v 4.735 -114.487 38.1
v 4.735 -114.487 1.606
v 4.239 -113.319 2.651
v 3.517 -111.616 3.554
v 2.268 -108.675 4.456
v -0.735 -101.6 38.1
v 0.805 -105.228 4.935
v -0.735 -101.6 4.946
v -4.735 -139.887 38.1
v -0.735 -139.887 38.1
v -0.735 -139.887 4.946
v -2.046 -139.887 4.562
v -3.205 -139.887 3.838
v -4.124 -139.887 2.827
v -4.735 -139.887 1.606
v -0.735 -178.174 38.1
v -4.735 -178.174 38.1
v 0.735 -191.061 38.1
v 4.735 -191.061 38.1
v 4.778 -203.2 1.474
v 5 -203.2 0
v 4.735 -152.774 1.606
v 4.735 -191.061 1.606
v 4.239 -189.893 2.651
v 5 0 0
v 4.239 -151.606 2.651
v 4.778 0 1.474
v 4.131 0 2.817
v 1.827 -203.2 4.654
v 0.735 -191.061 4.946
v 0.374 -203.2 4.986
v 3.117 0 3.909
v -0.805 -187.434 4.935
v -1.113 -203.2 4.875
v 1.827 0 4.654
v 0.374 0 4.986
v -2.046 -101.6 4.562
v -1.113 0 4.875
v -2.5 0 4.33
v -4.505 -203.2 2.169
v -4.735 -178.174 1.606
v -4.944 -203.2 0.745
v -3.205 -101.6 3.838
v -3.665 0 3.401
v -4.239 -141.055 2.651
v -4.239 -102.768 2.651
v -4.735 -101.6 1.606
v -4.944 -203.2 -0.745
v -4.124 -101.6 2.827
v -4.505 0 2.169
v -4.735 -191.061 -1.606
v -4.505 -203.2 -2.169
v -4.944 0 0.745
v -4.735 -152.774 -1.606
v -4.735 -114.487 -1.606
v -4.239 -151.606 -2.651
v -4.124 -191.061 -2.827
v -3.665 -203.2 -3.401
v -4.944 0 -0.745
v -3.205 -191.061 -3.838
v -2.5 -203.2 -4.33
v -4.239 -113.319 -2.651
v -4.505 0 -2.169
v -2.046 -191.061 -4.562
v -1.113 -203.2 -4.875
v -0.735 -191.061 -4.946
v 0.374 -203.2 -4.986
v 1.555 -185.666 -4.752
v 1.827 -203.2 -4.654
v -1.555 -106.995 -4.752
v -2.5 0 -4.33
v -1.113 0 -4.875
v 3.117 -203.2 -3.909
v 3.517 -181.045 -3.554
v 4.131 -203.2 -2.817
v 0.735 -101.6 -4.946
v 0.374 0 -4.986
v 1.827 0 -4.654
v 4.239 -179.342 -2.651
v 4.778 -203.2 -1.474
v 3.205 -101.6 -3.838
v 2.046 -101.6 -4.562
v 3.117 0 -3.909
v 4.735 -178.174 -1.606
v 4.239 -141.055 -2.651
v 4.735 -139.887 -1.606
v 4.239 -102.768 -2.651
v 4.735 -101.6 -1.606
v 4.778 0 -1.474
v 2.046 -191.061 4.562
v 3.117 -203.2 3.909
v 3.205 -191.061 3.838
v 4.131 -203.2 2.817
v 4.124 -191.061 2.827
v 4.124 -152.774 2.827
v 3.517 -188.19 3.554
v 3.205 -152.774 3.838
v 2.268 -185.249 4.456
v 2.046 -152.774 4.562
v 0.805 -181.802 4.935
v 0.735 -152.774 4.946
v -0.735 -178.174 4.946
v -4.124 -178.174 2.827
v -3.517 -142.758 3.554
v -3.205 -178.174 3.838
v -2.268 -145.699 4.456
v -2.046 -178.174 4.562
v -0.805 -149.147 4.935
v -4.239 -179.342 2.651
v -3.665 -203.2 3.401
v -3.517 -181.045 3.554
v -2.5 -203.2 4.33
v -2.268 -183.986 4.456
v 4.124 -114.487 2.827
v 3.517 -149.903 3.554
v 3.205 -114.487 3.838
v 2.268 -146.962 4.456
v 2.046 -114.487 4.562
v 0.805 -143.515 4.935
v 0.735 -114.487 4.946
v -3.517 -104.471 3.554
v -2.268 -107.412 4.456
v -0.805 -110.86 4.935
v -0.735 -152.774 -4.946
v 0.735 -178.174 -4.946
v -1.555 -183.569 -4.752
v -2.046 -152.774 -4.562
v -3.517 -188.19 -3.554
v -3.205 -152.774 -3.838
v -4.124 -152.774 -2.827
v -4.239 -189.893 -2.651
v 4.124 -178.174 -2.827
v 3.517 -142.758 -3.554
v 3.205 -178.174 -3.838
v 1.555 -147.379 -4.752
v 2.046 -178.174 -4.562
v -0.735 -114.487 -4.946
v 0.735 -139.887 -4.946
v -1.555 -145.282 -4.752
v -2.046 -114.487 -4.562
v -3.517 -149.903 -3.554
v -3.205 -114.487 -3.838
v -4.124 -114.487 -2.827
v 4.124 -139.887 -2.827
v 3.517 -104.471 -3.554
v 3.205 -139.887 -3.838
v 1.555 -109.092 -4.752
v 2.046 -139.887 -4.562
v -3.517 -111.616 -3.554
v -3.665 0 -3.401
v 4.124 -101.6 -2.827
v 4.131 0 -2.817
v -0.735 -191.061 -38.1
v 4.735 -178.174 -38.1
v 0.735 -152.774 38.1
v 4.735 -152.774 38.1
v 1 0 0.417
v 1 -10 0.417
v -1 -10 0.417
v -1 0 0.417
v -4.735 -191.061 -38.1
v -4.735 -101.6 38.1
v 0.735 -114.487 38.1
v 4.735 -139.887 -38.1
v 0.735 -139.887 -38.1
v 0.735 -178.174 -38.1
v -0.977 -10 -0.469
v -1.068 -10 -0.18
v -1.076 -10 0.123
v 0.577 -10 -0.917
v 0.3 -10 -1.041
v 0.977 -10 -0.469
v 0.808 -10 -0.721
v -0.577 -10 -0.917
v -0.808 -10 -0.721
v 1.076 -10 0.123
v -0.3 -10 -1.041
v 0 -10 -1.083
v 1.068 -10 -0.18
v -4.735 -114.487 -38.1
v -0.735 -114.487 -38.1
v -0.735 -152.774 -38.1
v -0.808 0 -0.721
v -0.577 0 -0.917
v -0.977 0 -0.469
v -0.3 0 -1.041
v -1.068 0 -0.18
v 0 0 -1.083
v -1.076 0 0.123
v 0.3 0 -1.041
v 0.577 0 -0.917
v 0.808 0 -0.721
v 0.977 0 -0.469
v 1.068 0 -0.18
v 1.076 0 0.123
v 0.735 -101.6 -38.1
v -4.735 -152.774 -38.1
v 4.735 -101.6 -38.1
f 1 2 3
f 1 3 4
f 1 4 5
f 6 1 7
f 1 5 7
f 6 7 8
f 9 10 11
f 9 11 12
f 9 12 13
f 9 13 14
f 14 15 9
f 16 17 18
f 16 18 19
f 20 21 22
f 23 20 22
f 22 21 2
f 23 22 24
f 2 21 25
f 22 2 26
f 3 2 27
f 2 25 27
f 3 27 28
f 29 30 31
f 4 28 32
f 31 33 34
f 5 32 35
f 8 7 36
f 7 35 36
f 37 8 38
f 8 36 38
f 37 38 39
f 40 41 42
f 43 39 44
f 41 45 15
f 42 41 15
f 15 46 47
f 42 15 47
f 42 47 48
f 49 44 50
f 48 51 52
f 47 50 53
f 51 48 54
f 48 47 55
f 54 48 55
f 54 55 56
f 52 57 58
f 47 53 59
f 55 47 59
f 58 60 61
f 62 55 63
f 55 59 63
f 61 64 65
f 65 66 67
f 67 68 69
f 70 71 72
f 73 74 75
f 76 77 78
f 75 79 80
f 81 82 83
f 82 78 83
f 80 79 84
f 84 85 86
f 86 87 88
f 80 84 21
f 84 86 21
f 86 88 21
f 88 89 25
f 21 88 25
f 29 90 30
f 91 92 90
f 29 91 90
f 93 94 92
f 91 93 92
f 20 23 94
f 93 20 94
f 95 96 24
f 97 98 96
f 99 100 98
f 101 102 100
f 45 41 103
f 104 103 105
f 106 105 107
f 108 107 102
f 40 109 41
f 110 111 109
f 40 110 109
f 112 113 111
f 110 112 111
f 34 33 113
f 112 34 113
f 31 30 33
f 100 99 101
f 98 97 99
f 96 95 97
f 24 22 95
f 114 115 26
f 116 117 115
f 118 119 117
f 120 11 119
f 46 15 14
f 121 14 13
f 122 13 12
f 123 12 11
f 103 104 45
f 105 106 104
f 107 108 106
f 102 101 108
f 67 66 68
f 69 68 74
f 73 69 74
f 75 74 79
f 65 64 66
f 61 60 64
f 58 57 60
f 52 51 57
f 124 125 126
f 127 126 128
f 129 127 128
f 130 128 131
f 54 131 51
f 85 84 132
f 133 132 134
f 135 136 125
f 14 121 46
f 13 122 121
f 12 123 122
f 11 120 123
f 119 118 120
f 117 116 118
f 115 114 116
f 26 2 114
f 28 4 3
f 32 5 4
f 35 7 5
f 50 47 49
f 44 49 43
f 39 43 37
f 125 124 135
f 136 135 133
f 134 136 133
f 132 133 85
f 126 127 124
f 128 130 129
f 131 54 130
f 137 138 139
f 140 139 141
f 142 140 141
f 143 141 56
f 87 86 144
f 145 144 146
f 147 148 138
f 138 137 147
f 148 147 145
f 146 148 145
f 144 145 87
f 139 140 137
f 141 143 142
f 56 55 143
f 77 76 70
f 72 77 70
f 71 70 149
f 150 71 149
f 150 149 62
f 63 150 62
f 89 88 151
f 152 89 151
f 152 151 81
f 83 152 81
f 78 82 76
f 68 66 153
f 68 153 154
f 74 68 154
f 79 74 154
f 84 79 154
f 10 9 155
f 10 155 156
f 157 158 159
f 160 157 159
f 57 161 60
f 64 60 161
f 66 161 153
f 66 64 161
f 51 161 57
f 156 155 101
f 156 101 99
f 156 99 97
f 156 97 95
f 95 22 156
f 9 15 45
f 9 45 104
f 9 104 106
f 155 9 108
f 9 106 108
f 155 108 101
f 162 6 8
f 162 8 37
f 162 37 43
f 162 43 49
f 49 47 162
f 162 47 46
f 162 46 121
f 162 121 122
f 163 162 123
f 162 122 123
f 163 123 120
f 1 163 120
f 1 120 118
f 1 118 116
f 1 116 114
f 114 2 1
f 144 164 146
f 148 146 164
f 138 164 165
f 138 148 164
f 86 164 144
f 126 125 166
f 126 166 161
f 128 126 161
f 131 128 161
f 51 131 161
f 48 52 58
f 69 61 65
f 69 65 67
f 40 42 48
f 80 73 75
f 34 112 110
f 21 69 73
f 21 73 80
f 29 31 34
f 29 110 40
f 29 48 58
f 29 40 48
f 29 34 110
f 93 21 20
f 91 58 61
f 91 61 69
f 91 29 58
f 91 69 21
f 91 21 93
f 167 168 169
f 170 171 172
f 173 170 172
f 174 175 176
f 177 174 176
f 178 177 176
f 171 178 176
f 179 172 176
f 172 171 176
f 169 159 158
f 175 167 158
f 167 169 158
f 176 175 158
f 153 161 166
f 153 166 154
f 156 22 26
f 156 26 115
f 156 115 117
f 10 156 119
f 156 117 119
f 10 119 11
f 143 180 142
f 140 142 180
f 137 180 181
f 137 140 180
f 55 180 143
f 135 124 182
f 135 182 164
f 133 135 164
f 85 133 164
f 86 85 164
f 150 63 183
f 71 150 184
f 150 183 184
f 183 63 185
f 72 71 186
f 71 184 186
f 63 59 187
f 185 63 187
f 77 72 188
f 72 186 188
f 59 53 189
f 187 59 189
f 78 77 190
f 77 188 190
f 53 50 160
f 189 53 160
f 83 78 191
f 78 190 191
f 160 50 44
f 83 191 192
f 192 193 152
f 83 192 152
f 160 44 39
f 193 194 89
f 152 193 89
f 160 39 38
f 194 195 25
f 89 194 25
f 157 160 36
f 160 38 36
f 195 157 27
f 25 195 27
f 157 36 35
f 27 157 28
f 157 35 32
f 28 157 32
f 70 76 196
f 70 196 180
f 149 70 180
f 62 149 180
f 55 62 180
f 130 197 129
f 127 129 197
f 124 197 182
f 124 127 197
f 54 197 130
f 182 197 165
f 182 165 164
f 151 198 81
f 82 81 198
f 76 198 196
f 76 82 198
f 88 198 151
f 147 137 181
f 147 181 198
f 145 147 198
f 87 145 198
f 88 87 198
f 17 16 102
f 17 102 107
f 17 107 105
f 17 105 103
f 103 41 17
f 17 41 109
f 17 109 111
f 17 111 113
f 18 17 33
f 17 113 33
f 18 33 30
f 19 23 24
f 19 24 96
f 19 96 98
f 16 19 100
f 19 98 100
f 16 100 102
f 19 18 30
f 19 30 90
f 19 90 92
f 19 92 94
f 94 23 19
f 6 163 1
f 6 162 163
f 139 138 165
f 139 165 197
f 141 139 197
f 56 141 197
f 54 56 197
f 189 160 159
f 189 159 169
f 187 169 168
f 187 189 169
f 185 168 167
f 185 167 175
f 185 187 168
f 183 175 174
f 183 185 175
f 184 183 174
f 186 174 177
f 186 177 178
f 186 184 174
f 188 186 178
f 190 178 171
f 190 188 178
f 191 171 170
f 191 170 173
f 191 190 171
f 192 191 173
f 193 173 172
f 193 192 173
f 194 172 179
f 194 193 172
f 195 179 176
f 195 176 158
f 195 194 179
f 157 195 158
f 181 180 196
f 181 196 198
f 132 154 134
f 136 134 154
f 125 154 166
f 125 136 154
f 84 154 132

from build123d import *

# Parameters (mm, degrees)
F0_R     = 5
F1_DEPTH = 203.2
F3_DEPTH = 38.1
F5_DEPTH = 38.1
F7_DEPTH = 10


with BuildPart() as f1:
    # F0 (on Front) → F1 (new body)
    with BuildSketch(Plane.XZ):
        Circle(F0_R)
    extrude(amount=F1_DEPTH)

    # F2 (on Top) → F3 (join)
    with BuildSketch(Plane.XY):
        Polygon((0.735118, -114.487068), (4.735118, -114.487068), (-0.735118, -101.6), (-4.735118, -101.6), align=None)
        Polygon((4.735118, -152.774136), (-0.735118, -139.887068), (-4.735118, -139.887068), (0.735118, -152.774136), align=None)
        Polygon((4.735118, -191.061204), (-0.735118, -178.174136), (-4.735118, -178.174136), (0.735118, -191.061204), align=None)
    extrude(amount=F3_DEPTH)

    # F4 (on Top) → F5 (join)
    with BuildSketch(Plane.XY):
        Polygon((-4.735118, -114.487068), (-0.735118, -114.487068), (4.735118, -101.6), (0.735118, -101.6), align=None)
        Polygon((-4.735118, -152.774136), (-0.735118, -152.774136), (4.735118, -139.887068), (0.735118, -139.887068), align=None)
        Polygon((-4.735118, -191.061204), (-0.735118, -191.061204), (4.735118, -178.174136), (0.735118, -178.174136), align=None)
    extrude(amount=-F5_DEPTH)

    # F6 (on Front) → F7 (cut)
    with BuildSketch(Plane.XZ):
        with BuildLine():
            Line((1, 0.416667), (-1, 0.416667))
            ThreePointArc((-1, 0.416667), (0, -1.083333), (1, 0.416667))
        make_face()
    extrude(amount=F7_DEPTH, mode=Mode.SUBTRACT)


solid = f1.part
